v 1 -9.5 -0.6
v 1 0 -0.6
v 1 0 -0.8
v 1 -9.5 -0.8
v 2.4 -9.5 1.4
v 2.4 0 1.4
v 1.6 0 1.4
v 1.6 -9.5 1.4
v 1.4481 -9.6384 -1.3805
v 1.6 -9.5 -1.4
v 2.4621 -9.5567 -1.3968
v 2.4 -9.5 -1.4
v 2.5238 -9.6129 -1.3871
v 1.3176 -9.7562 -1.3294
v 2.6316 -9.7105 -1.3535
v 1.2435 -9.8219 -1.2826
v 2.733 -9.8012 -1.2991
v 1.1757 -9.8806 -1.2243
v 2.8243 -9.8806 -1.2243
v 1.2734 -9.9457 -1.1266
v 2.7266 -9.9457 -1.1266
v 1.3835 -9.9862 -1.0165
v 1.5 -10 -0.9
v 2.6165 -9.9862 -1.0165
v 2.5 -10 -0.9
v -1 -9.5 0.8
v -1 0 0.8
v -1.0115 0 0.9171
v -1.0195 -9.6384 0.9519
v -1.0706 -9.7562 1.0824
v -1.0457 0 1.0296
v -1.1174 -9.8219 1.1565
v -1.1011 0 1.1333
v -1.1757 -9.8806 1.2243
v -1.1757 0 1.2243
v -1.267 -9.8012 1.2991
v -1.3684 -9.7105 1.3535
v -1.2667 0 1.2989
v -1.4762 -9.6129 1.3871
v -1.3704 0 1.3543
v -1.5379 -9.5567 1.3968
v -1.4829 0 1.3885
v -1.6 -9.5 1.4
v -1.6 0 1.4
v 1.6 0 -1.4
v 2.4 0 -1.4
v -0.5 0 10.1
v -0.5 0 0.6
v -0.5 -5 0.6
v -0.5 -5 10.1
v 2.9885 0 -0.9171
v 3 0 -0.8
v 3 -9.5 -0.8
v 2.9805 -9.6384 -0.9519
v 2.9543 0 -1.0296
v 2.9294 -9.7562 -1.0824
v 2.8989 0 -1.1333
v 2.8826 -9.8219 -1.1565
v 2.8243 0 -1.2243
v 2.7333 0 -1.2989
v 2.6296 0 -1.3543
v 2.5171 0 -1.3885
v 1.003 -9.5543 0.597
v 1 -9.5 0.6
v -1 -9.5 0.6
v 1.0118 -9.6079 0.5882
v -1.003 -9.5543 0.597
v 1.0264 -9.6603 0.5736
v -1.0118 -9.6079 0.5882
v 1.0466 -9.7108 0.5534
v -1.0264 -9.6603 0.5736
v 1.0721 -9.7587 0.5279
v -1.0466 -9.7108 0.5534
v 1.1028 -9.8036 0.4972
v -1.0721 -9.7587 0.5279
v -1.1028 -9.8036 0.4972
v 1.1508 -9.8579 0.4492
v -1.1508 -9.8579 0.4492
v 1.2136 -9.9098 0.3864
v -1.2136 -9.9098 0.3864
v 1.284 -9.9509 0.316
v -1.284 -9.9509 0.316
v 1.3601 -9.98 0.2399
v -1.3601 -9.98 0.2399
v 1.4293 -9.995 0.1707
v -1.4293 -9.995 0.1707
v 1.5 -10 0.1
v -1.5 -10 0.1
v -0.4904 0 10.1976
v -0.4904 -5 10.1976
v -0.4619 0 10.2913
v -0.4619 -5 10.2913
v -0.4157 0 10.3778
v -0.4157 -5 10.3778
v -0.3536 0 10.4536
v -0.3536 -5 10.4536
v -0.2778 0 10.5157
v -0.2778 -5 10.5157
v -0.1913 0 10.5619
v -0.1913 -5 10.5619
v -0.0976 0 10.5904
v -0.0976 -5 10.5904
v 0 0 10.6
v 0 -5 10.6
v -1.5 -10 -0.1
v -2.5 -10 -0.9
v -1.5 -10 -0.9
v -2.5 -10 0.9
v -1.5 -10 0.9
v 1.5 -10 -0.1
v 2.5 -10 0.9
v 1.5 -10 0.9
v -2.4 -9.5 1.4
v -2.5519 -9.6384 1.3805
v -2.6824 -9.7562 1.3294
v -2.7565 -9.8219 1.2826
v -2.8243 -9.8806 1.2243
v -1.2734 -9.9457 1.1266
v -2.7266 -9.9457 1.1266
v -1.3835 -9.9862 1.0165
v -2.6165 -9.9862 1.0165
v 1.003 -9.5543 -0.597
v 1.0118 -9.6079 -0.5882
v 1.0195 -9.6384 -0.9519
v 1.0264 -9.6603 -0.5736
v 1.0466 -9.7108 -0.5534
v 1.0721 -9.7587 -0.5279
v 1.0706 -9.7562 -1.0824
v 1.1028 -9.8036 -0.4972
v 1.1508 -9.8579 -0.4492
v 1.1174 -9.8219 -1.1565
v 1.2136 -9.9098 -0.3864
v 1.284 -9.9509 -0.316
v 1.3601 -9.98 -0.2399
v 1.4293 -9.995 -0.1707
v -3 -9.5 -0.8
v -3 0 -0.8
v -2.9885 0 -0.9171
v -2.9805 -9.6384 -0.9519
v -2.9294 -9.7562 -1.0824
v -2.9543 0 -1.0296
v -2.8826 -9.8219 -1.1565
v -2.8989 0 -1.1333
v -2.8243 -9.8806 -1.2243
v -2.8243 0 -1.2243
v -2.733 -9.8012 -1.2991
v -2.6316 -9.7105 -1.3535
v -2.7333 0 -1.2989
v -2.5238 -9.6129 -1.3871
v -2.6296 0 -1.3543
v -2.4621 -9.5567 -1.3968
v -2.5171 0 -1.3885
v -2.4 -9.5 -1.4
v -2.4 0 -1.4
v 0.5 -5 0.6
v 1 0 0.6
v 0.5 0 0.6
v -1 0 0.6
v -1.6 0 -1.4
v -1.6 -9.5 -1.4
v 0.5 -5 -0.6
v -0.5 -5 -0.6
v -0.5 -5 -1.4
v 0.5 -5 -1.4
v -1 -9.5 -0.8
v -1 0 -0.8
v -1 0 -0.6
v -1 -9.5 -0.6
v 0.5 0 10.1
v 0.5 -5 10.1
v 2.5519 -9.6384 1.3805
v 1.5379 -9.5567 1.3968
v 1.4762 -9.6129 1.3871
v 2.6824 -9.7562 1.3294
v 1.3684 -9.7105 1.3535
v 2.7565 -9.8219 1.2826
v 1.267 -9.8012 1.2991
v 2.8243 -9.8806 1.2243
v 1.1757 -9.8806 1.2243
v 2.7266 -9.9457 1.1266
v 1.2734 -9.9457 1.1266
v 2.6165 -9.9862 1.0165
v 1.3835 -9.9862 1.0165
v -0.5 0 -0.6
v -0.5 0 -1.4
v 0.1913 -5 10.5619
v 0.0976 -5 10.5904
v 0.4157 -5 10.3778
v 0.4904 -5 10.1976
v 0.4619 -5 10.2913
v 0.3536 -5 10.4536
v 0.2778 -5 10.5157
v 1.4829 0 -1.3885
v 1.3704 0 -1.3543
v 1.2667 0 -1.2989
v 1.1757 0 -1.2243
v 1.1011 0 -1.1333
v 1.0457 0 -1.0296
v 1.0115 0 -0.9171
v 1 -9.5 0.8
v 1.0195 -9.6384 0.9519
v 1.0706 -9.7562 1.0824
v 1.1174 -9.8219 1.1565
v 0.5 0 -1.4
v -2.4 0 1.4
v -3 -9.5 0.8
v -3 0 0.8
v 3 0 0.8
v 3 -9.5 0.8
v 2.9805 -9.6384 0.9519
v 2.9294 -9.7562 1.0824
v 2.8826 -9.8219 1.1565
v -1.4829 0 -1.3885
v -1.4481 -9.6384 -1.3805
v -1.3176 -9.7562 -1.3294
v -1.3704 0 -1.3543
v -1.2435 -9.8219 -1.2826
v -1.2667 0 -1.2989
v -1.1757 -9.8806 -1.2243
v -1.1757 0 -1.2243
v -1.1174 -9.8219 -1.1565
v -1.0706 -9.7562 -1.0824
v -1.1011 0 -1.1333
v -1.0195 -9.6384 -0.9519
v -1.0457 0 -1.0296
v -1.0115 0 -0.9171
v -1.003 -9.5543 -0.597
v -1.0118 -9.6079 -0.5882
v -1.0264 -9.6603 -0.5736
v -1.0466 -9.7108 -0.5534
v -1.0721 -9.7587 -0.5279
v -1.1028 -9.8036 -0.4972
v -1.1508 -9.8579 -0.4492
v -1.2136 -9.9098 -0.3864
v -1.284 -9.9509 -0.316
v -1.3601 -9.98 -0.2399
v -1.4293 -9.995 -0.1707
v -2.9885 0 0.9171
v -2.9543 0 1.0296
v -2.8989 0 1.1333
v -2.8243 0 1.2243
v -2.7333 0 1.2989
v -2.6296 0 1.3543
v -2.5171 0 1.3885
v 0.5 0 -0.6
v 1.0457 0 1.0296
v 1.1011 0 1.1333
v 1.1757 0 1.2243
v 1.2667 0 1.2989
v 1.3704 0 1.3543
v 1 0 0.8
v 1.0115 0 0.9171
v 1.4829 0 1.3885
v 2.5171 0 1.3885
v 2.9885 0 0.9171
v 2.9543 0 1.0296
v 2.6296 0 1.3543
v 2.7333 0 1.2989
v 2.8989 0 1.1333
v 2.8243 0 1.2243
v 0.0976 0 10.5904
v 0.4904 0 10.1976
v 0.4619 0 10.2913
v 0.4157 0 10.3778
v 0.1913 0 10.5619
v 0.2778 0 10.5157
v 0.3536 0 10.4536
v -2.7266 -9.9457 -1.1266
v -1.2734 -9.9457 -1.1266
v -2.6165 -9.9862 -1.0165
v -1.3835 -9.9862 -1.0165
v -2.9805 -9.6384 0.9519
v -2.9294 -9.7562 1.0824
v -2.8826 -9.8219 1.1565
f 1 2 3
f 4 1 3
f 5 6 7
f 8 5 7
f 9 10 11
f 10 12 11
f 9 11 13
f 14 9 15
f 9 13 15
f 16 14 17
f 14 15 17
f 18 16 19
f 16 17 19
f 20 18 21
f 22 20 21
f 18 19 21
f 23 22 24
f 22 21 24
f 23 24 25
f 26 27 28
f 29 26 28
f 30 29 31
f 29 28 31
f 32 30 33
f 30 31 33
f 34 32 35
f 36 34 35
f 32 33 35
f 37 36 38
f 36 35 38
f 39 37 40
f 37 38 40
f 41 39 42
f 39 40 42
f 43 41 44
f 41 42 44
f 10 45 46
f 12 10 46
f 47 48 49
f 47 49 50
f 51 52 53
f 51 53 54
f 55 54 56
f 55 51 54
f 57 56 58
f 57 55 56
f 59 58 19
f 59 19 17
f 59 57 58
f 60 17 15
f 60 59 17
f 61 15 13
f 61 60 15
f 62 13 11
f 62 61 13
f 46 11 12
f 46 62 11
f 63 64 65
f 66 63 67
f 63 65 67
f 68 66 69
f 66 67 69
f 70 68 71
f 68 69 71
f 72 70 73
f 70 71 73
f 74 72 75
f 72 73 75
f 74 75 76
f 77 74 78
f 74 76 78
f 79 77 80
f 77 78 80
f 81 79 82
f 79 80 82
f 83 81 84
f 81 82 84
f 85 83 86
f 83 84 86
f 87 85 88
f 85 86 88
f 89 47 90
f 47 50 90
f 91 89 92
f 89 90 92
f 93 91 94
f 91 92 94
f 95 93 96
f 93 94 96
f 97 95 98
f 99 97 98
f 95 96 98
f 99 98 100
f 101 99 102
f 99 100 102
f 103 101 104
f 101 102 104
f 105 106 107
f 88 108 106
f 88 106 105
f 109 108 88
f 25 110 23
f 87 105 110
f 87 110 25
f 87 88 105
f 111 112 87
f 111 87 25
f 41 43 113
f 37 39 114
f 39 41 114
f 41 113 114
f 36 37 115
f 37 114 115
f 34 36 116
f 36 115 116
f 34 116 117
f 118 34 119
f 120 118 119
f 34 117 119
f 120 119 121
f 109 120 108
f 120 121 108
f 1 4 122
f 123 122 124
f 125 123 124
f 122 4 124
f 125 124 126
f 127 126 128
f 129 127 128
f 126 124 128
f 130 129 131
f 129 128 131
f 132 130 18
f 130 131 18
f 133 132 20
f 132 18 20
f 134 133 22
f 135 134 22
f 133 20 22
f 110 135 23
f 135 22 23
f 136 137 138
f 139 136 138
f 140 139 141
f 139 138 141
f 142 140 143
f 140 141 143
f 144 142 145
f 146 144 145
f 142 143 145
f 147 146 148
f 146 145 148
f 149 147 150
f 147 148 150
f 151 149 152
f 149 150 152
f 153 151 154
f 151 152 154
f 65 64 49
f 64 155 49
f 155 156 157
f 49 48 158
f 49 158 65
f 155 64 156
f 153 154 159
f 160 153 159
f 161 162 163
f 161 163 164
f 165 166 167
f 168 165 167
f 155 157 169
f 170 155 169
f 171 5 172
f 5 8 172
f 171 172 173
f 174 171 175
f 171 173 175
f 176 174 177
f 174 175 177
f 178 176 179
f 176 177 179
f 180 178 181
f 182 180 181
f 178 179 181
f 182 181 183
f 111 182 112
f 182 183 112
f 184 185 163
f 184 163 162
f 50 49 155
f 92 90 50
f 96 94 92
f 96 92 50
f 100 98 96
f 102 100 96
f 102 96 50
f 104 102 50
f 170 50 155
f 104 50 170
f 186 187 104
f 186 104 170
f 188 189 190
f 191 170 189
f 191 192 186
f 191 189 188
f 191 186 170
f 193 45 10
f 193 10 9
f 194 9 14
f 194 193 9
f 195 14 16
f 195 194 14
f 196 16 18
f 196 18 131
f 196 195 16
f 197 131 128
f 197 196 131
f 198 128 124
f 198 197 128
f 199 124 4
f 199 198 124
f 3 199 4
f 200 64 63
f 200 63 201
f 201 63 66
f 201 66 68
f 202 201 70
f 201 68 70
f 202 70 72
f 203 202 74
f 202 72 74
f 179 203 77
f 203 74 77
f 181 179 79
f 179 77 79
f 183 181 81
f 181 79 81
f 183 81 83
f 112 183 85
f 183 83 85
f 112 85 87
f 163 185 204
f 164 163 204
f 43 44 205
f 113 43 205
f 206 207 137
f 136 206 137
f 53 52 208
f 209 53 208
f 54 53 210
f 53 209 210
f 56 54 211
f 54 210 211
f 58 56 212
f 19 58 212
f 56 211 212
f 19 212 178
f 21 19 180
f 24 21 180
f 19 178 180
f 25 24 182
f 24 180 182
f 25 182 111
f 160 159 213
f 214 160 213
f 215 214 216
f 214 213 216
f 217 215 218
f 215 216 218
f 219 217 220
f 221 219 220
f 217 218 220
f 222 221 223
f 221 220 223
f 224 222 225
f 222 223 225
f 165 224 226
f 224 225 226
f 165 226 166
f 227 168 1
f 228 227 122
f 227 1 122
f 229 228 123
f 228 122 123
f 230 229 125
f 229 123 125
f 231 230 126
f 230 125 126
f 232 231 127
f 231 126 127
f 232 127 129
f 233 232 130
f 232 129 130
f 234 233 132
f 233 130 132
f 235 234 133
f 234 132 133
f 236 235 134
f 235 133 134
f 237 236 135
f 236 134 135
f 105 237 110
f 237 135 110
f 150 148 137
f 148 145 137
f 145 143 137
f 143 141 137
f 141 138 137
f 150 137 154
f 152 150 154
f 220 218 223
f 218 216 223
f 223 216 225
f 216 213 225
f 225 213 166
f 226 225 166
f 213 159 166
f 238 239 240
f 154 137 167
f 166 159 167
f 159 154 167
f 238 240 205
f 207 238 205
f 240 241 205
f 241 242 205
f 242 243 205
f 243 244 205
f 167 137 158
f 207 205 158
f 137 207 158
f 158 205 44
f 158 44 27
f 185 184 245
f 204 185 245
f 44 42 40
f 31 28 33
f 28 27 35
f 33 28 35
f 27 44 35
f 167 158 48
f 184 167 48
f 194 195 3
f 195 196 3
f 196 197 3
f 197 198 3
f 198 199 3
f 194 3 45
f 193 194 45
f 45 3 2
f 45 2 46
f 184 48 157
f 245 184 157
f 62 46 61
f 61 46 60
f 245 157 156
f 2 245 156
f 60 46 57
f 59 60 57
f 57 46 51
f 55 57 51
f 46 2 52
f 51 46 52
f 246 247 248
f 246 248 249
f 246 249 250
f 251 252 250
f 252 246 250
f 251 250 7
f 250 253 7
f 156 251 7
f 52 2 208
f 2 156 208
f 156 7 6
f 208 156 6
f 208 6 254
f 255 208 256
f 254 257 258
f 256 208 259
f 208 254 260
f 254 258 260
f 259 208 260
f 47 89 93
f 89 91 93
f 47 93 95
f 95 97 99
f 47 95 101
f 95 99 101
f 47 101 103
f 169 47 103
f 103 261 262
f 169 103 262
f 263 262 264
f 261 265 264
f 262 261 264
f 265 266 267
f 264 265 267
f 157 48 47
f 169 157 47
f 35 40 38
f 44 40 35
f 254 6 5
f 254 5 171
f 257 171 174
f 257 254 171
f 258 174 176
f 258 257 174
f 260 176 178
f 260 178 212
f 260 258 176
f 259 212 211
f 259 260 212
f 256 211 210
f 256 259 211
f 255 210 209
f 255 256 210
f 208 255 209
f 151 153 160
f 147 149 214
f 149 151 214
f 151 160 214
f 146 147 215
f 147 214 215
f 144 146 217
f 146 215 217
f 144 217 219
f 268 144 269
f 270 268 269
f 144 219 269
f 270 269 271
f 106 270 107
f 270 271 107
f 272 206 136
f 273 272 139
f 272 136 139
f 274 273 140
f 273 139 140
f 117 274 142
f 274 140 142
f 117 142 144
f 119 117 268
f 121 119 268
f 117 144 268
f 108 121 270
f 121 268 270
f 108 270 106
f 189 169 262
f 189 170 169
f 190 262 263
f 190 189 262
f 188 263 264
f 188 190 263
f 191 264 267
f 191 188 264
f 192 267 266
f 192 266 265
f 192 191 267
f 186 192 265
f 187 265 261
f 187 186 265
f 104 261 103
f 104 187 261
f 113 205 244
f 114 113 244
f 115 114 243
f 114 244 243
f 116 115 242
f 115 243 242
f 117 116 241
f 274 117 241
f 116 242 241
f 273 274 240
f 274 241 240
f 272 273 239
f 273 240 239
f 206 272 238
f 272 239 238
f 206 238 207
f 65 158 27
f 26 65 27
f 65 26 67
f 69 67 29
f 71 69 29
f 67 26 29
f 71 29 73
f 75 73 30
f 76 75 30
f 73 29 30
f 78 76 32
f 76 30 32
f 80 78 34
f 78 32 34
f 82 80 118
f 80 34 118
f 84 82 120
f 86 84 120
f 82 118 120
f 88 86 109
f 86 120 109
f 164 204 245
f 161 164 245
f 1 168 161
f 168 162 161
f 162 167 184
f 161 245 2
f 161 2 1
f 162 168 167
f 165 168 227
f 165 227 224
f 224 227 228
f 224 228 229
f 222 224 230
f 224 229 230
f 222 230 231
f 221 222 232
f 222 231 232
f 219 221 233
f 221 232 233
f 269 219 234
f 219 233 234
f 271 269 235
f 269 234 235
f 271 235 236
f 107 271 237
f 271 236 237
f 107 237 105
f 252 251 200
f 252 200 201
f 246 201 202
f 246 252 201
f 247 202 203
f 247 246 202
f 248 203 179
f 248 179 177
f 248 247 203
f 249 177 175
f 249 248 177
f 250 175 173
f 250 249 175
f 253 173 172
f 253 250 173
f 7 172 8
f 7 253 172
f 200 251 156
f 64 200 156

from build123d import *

# Parameters (mm, degrees)
F0_W        = 1.5
F0_H        = 1.2
F0_W_2      = 0.5
F0_W_3      = 1
F1_DEPTH    = 10
F0_H_2      = 10
F0_H_3      = 0.8
F2_DEPTH    = 5
F3_R        = 0.49999
F4_R        = 0.5
F5_T1_DEPTH = 12.5


# Not quite as in the source:
# - a fillet or chamfer that OpenCascade refuses, or shapes differently, is made with other operations: its cross-section is extruded or revolved along the edge and cut away or added
# - a fillet or chamfer is up to 0.001 mm smaller than in the source, because OpenCascade refuses the exact size


with BuildPart() as f1:
    # F0 (on Front) → F1 (new body)
    with BuildSketch(Plane.XZ):
        Polygon((1, 0.6), (2.5, 0.6), (2.5, -0.6), (1, -0.6), (1, -1.4), (3, -1.4), (3, 1.4), (1, 1.4), align=None)
        Polygon((-2.5, 0.6), (-1, 0.6), (-1, 1.4), (-3, 1.4), (-3, -1.4), (-1, -1.4), (-1, -0.6), (-2.5, -0.6), align=None)
        with Locations((1.75, 0)):
            Rectangle(F0_W, F0_H)
        with Locations((0.75, 0)):
            Rectangle(F0_W_2, F0_H)
        with Locations((-0.75, 0)):
            Rectangle(F0_W_2, F0_H)
        with Locations((-1.75, 0)):
            Rectangle(F0_W, F0_H)
        Rectangle(F0_W_3, F0_H)
    extrude(amount=F1_DEPTH)

    # F0 (on Front) → F2 (join)
    with BuildSketch(Plane.XZ):
        with Locations((0, 5.6)):
            Rectangle(F0_W_3, F0_H_2)
        with Locations((0, -1)):
            Rectangle(F0_W_3, F0_H_3)
    extrude(amount=F2_DEPTH)

    # F3 (radius 0.5 in the source; OpenCascade refuses exactly that, so slightly less here)
    f3_edges = [f1.edges().sort_by_distance(p)[0] for p in [
        (0.5, -2.5, 10.6),
        (-0.5, -2.5, 10.6),
    ]]
    fillet(f3_edges, radius=F3_R)

    # F4
    f4_edges = [f1.edges().sort_by_distance(p)[0] for p in [
        (2, -10, -1.4),
        (3, -10, 0),
        (2, -10, 1.4),
        (1, -10, 1),
        (0, -10, 0.6),
        (-1, -10, 1),
        (-2, -10, 1.4),
        (-3, -10, 0),
        (-2, -10, -1.4),
        (-1, -10, -1),
        (0, -10, -0.6),
        (1, -10, -1),
    ]]
    fillet(f4_edges, radius=F4_R)

    # F5: fillet of radius 0.6 on 8 edges, made by hand

    # F5_s2 → F5_t1 (cut)
    with BuildSketch(Plane.XZ.offset(-1.5)):
        with BuildLine():
            ThreePointArc((-2.4, 1.4), (-2.8242640687, 1.2242640687), (-3, 0.8))
            Line((-3, 0.8), (-3, 1.4))
            Line((-3, 1.4), (-2.4, 1.4))
        make_face()
        with BuildLine():
            ThreePointArc((-1, 0.8), (-1.1757359313, 1.2242640687), (-1.6, 1.4))
            Line((-1.6, 1.4), (-1, 1.4))
            Line((-1, 1.4), (-1, 0.8))
        make_face()
        with BuildLine():
            ThreePointArc((1, 0.8), (1.1757359313, 1.2242640687), (1.6, 1.4))
            Line((1.6, 1.4), (1, 1.4))
            Line((1, 1.4), (1, 0.8))
        make_face()
        with BuildLine():
            ThreePointArc((2.4, 1.4), (2.8242640687, 1.2242640687), (3, 0.8))
            Line((3, 0.8), (3, 1.4))
            Line((3, 1.4), (2.4, 1.4))
        make_face()
        with BuildLine():
            ThreePointArc((-3, -0.8), (-2.8242640687, -1.2242640687), (-2.4, -1.4))
            Line((-2.4, -1.4), (-3, -1.4))
            Line((-3, -1.4), (-3, -0.8))
        make_face()
        with BuildLine():
            ThreePointArc((-1.6, -1.4), (-1.1757359313, -1.2242640687), (-1, -0.8))
            Line((-1, -0.8), (-1, -1.4))
            Line((-1, -1.4), (-1.6, -1.4))
        make_face()
        with BuildLine():
            ThreePointArc((1.6, -1.4), (1.1757359313, -1.2242640687), (1, -0.8))
            Line((1, -0.8), (1, -1.4))
            Line((1, -1.4), (1.6, -1.4))
        make_face()
        with BuildLine():
            ThreePointArc((3, -0.8), (2.8242640687, -1.2242640687), (2.4, -1.4))
            Line((2.4, -1.4), (3, -1.4))
            Line((3, -1.4), (3, -0.8))
        make_face()
    extrude(amount=F5_T1_DEPTH, mode=Mode.SUBTRACT)


solid = f1.part
